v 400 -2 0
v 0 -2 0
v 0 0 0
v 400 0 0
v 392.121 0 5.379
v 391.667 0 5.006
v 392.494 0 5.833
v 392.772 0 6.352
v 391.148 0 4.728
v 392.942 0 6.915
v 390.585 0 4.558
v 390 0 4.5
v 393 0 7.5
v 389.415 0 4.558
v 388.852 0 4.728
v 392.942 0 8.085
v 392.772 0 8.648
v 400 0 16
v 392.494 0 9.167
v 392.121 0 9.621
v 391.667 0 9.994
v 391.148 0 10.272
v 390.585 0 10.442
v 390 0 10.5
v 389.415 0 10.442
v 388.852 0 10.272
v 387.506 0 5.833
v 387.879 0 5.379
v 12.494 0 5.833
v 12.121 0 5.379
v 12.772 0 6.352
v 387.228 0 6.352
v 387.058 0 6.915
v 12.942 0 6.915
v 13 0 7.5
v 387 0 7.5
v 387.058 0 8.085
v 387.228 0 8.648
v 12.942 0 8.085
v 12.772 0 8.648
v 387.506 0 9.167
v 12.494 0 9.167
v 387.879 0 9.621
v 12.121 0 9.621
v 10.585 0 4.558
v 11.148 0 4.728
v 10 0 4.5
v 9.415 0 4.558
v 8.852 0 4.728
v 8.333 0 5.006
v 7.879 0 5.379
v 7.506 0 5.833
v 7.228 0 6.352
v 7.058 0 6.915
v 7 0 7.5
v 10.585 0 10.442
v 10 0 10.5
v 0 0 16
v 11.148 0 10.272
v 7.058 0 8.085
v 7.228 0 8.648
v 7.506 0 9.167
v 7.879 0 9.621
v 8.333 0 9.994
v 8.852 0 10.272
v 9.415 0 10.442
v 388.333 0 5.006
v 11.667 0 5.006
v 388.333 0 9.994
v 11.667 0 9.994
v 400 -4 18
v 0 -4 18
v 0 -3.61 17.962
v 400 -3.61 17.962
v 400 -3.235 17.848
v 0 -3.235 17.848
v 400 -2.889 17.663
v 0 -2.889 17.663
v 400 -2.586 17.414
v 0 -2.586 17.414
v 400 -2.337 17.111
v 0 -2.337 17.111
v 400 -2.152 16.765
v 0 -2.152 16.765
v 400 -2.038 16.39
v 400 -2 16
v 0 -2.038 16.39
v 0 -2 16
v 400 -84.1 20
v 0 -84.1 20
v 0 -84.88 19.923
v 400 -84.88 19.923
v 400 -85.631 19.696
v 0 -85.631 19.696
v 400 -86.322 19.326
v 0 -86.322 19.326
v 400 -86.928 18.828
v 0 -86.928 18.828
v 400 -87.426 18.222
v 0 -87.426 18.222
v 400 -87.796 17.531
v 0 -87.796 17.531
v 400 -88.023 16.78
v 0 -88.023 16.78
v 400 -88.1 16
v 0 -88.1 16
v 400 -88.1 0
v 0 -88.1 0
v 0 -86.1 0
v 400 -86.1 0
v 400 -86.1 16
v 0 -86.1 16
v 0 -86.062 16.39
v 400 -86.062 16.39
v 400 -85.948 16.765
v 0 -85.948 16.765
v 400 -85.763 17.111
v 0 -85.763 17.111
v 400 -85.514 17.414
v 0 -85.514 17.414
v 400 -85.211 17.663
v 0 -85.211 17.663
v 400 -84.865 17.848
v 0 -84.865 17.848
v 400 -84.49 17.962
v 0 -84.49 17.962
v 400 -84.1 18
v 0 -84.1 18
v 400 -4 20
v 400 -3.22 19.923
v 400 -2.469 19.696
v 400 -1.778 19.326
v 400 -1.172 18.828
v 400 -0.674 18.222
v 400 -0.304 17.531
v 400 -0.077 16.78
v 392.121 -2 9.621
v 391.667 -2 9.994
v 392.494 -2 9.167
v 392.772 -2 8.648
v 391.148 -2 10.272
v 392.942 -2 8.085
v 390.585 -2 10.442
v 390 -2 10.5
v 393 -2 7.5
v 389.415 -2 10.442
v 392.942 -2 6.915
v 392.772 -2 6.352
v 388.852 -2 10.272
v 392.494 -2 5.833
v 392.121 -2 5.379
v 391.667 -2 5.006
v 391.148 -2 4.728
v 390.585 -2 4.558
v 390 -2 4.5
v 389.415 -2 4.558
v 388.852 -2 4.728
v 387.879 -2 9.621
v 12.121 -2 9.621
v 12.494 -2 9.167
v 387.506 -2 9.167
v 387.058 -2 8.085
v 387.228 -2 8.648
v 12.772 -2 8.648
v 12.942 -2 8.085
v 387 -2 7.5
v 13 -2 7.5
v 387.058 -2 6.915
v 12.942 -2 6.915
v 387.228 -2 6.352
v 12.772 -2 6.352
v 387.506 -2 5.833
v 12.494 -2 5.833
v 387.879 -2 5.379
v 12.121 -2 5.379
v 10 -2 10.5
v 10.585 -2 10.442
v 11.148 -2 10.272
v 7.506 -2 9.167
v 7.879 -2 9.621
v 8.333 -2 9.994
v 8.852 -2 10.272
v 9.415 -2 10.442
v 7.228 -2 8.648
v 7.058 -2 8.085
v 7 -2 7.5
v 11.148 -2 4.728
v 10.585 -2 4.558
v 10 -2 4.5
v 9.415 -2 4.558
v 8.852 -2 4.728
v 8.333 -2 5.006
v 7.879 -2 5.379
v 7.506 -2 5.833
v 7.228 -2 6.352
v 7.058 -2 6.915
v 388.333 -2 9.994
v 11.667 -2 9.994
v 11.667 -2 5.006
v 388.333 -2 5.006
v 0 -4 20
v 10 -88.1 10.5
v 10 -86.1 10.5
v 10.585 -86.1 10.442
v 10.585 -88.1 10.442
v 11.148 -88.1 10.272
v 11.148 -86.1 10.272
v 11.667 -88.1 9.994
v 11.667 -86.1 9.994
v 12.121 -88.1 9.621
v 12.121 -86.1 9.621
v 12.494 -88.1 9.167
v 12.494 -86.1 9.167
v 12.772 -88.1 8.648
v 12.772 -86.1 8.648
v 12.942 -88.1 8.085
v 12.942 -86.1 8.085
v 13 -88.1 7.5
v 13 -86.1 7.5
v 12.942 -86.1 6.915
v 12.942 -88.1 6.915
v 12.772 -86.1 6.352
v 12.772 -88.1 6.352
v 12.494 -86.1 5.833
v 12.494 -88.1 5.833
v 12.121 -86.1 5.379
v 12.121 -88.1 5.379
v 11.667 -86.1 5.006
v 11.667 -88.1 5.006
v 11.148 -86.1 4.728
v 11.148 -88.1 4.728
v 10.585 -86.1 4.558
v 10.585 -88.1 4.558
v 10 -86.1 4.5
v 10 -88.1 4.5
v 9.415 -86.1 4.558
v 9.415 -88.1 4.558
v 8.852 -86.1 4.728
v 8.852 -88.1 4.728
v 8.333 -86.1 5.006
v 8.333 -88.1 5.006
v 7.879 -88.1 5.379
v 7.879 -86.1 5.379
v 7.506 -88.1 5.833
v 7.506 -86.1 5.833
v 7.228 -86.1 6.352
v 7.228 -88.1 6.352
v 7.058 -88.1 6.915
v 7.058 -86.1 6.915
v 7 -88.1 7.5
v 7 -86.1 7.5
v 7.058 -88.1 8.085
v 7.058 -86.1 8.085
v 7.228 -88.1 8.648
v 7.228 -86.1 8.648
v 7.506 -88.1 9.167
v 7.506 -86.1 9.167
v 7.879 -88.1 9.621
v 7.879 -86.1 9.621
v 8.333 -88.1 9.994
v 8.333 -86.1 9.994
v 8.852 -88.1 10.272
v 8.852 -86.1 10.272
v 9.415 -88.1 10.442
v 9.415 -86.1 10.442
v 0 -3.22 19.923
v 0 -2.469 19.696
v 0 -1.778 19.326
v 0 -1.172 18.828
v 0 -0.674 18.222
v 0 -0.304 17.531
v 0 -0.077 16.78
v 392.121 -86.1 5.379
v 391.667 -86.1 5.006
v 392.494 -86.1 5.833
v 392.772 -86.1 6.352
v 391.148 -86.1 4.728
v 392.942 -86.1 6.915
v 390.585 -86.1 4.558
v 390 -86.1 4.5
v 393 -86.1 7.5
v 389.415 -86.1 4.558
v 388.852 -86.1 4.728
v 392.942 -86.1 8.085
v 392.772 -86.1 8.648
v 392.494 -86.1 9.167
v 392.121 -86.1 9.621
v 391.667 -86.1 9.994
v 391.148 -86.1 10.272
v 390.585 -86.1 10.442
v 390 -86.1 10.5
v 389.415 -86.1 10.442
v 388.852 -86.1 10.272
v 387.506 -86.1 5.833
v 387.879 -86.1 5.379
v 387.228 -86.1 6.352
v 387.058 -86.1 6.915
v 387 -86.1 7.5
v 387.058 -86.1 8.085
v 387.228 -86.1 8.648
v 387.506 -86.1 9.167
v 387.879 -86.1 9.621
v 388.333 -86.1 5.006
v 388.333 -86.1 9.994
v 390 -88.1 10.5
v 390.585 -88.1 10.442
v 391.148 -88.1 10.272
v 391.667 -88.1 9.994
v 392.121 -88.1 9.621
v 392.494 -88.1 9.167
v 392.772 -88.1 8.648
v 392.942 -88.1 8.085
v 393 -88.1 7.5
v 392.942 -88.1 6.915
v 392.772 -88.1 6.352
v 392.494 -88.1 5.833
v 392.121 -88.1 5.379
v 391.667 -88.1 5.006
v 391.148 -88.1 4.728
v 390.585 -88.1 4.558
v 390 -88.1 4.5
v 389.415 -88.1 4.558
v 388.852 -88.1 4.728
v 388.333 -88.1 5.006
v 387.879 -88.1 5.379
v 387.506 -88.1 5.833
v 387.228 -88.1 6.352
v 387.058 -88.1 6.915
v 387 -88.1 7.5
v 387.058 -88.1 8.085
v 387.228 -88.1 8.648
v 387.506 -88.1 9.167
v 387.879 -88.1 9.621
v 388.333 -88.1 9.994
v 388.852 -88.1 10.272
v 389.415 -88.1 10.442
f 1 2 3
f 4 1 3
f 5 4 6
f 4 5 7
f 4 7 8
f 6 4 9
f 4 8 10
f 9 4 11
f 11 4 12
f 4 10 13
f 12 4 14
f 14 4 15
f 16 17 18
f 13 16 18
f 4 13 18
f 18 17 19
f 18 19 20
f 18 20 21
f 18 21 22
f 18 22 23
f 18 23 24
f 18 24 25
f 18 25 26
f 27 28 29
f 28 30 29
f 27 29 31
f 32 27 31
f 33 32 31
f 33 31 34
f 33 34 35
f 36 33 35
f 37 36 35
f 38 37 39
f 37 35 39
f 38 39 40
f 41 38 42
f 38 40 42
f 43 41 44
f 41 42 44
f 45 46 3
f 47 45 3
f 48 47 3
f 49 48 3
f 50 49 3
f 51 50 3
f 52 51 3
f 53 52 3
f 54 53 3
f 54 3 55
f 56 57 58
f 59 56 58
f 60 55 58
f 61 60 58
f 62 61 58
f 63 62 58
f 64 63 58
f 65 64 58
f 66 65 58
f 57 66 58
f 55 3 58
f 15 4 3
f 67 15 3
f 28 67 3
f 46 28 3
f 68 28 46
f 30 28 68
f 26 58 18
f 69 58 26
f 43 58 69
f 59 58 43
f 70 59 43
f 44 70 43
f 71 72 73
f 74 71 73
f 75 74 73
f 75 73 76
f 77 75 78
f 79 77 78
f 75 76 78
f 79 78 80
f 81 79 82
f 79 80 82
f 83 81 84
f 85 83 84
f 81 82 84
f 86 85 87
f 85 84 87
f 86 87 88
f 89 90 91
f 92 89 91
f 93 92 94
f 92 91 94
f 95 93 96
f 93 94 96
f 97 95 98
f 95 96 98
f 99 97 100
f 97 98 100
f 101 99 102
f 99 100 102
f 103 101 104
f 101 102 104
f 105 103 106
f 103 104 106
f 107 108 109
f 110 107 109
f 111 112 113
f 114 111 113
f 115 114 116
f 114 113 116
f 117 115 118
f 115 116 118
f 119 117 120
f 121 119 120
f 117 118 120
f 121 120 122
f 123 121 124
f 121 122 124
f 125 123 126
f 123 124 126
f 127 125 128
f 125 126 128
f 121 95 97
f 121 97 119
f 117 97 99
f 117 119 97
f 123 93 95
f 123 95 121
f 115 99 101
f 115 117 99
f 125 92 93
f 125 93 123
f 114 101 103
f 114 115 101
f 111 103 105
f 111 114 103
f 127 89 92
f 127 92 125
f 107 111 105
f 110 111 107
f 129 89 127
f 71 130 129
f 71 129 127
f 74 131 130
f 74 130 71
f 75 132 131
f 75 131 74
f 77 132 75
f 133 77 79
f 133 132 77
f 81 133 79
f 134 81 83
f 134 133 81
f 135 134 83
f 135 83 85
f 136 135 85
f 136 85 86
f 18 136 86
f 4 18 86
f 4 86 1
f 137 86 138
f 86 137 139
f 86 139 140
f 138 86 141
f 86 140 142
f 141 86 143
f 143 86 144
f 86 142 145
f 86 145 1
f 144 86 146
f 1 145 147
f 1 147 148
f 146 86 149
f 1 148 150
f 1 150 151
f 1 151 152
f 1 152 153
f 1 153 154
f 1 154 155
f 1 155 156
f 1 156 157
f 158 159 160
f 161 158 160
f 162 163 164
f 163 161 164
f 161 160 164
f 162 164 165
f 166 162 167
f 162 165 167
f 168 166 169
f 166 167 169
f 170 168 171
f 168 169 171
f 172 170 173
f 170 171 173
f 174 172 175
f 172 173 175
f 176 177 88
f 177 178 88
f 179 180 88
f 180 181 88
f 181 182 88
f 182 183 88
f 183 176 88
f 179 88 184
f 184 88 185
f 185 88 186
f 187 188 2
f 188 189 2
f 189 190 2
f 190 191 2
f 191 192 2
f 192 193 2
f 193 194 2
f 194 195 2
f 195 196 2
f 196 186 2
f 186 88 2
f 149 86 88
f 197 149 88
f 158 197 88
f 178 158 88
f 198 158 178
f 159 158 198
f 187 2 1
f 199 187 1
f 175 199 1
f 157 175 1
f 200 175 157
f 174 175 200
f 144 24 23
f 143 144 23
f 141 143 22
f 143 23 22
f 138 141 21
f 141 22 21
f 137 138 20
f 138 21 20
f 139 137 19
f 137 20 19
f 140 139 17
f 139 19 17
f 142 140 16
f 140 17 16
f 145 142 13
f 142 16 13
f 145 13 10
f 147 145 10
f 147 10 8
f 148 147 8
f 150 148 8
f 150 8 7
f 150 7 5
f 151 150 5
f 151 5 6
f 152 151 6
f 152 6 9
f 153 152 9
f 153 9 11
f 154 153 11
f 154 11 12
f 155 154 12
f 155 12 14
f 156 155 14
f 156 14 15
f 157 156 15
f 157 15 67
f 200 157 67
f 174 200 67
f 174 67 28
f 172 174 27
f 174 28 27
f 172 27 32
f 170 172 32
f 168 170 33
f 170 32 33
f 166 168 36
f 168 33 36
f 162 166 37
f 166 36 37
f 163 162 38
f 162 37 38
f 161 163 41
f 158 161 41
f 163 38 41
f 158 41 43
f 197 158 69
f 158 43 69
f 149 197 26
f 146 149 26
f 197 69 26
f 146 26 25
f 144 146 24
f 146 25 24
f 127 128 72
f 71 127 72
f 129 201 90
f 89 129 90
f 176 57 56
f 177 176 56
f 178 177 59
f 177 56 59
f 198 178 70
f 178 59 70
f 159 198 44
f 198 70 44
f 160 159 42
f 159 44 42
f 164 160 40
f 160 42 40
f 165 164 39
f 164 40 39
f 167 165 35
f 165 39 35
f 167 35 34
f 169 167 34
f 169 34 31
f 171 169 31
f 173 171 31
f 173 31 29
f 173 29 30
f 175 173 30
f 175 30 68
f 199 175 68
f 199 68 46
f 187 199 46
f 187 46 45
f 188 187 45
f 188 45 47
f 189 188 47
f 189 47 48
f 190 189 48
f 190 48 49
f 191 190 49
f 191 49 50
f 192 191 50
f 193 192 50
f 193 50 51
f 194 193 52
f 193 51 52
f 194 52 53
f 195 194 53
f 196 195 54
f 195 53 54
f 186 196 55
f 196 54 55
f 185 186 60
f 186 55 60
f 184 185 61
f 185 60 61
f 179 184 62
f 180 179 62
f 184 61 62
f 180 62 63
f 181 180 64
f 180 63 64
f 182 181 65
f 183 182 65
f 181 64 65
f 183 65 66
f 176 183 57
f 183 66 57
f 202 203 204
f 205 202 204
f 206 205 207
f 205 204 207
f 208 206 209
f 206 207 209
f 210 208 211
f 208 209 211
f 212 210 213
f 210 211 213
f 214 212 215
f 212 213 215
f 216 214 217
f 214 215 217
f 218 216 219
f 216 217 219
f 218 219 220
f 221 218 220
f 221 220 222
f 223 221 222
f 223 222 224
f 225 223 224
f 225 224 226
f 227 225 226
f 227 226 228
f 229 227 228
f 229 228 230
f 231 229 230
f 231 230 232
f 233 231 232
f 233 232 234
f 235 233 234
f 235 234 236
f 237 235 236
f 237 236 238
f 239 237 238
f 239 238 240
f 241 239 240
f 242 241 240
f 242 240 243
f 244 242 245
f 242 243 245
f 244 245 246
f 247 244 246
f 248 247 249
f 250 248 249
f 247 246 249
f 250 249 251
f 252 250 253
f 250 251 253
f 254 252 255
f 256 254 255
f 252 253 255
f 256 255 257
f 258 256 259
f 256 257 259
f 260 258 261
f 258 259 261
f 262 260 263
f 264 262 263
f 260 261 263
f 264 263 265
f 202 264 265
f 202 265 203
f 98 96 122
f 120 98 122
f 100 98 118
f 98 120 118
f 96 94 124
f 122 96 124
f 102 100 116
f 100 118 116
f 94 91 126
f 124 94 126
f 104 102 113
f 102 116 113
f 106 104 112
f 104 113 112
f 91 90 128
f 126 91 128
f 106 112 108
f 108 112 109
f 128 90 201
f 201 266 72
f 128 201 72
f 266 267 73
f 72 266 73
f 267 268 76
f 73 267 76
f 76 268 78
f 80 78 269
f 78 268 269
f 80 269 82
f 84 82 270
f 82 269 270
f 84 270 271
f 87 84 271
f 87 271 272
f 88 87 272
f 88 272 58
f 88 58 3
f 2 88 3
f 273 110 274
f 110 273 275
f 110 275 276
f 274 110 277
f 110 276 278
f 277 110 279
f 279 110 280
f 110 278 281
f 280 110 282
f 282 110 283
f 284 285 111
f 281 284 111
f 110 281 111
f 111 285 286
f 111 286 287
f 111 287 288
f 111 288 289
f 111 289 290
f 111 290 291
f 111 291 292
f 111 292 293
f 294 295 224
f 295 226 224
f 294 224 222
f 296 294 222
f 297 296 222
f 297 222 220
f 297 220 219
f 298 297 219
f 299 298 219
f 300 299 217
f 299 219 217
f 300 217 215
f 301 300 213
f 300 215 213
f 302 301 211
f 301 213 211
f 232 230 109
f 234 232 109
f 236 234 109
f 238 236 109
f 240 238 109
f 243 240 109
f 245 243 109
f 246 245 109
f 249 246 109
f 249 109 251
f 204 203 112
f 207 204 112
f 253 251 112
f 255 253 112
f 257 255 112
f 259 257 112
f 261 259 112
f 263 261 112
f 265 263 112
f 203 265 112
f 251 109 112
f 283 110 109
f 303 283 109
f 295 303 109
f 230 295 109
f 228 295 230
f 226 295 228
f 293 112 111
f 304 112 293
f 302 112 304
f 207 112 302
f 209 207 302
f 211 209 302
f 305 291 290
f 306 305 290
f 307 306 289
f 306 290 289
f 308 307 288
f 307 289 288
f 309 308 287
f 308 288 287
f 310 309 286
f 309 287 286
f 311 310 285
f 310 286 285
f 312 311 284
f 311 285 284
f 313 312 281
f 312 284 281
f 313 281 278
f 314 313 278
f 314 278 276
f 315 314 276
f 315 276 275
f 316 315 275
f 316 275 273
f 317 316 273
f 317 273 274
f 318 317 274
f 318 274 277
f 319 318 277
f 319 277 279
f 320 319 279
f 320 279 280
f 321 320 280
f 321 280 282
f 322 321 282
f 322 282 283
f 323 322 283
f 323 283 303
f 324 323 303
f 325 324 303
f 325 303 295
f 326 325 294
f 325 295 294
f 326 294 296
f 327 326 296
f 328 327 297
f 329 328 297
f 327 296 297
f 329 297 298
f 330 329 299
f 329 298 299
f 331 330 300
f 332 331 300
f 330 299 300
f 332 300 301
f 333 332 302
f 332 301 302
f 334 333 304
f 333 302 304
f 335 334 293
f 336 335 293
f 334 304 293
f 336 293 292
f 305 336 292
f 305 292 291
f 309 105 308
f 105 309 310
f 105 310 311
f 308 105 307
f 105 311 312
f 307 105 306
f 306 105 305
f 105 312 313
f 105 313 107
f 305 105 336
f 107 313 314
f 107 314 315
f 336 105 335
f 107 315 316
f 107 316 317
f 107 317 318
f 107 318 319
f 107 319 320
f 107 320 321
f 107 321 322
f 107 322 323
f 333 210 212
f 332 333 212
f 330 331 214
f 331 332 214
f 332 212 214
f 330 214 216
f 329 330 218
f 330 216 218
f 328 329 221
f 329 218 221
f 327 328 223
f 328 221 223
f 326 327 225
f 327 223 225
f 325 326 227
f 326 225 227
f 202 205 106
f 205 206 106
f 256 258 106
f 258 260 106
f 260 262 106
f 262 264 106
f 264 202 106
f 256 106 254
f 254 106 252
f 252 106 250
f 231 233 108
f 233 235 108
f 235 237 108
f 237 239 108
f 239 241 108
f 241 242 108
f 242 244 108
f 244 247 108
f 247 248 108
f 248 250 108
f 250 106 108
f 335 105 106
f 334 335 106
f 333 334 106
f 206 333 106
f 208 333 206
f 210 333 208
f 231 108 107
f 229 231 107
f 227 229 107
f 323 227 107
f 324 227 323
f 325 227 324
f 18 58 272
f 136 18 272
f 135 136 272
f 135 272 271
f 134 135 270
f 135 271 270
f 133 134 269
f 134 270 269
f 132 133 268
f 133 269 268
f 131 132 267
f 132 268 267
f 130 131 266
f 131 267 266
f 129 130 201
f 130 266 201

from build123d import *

# Parameters (mm, degrees)
SM_BASE_FLANGE_2_DEPTH = 400
SKETCH_15_R            = 3
CUT_EXTRUDE_2_DEPTH    = 411.075127263


# Sheet-metal steps are written as plain solids
with BuildPart() as part:
    # Эскиз9 → Базовая кромка2 (new body)
    with BuildSketch(Plane(origin=(0, 0, 0), x_dir=(0, 0, -1), z_dir=(1, 0, 0))):
        with BuildLine():
            Line((0, 0), (-16, 0))
            ThreePointArc((-16, 0), (-18.828427125, -1.171572875), (-20, -4))
            Line((-20, -4), (-20, -84.1))
            ThreePointArc((-20, -84.1), (-18.828427125, -86.928427125), (-16, -88.1))
            Line((-16, -88.1), (0, -88.1))
            Line((0, -88.1), (0, -86.1))
            Line((0, -86.1), (-16, -86.1))
            ThreePointArc((-16, -86.1), (-17.414213562, -85.514213562), (-18, -84.1))
            Line((-18, -84.1), (-18, -4))
            ThreePointArc((-18, -4), (-17.414213562, -2.585786438), (-16, -2))
            Line((-16, -2), (0, -2))
            Line((0, -2), (0, 0))
        make_face()
    extrude(amount=SM_BASE_FLANGE_2_DEPTH)

    # Эскиз15 → Вырез-Вытянуть2 (cut, through all)
    with BuildSketch(Plane(origin=(0, 0, 0), x_dir=(1, 0, 0), z_dir=(0, 1, 0))):
        with Locations(Location((390, -7.5, 0), (0, 0, 270))):
            Circle(SKETCH_15_R)
        with Locations(Location((10, -7.5, 0), (0, 0, 270))):
            Circle(SKETCH_15_R)
    extrude(amount=-CUT_EXTRUDE_2_DEPTH, mode=Mode.SUBTRACT)


solid = part.part
